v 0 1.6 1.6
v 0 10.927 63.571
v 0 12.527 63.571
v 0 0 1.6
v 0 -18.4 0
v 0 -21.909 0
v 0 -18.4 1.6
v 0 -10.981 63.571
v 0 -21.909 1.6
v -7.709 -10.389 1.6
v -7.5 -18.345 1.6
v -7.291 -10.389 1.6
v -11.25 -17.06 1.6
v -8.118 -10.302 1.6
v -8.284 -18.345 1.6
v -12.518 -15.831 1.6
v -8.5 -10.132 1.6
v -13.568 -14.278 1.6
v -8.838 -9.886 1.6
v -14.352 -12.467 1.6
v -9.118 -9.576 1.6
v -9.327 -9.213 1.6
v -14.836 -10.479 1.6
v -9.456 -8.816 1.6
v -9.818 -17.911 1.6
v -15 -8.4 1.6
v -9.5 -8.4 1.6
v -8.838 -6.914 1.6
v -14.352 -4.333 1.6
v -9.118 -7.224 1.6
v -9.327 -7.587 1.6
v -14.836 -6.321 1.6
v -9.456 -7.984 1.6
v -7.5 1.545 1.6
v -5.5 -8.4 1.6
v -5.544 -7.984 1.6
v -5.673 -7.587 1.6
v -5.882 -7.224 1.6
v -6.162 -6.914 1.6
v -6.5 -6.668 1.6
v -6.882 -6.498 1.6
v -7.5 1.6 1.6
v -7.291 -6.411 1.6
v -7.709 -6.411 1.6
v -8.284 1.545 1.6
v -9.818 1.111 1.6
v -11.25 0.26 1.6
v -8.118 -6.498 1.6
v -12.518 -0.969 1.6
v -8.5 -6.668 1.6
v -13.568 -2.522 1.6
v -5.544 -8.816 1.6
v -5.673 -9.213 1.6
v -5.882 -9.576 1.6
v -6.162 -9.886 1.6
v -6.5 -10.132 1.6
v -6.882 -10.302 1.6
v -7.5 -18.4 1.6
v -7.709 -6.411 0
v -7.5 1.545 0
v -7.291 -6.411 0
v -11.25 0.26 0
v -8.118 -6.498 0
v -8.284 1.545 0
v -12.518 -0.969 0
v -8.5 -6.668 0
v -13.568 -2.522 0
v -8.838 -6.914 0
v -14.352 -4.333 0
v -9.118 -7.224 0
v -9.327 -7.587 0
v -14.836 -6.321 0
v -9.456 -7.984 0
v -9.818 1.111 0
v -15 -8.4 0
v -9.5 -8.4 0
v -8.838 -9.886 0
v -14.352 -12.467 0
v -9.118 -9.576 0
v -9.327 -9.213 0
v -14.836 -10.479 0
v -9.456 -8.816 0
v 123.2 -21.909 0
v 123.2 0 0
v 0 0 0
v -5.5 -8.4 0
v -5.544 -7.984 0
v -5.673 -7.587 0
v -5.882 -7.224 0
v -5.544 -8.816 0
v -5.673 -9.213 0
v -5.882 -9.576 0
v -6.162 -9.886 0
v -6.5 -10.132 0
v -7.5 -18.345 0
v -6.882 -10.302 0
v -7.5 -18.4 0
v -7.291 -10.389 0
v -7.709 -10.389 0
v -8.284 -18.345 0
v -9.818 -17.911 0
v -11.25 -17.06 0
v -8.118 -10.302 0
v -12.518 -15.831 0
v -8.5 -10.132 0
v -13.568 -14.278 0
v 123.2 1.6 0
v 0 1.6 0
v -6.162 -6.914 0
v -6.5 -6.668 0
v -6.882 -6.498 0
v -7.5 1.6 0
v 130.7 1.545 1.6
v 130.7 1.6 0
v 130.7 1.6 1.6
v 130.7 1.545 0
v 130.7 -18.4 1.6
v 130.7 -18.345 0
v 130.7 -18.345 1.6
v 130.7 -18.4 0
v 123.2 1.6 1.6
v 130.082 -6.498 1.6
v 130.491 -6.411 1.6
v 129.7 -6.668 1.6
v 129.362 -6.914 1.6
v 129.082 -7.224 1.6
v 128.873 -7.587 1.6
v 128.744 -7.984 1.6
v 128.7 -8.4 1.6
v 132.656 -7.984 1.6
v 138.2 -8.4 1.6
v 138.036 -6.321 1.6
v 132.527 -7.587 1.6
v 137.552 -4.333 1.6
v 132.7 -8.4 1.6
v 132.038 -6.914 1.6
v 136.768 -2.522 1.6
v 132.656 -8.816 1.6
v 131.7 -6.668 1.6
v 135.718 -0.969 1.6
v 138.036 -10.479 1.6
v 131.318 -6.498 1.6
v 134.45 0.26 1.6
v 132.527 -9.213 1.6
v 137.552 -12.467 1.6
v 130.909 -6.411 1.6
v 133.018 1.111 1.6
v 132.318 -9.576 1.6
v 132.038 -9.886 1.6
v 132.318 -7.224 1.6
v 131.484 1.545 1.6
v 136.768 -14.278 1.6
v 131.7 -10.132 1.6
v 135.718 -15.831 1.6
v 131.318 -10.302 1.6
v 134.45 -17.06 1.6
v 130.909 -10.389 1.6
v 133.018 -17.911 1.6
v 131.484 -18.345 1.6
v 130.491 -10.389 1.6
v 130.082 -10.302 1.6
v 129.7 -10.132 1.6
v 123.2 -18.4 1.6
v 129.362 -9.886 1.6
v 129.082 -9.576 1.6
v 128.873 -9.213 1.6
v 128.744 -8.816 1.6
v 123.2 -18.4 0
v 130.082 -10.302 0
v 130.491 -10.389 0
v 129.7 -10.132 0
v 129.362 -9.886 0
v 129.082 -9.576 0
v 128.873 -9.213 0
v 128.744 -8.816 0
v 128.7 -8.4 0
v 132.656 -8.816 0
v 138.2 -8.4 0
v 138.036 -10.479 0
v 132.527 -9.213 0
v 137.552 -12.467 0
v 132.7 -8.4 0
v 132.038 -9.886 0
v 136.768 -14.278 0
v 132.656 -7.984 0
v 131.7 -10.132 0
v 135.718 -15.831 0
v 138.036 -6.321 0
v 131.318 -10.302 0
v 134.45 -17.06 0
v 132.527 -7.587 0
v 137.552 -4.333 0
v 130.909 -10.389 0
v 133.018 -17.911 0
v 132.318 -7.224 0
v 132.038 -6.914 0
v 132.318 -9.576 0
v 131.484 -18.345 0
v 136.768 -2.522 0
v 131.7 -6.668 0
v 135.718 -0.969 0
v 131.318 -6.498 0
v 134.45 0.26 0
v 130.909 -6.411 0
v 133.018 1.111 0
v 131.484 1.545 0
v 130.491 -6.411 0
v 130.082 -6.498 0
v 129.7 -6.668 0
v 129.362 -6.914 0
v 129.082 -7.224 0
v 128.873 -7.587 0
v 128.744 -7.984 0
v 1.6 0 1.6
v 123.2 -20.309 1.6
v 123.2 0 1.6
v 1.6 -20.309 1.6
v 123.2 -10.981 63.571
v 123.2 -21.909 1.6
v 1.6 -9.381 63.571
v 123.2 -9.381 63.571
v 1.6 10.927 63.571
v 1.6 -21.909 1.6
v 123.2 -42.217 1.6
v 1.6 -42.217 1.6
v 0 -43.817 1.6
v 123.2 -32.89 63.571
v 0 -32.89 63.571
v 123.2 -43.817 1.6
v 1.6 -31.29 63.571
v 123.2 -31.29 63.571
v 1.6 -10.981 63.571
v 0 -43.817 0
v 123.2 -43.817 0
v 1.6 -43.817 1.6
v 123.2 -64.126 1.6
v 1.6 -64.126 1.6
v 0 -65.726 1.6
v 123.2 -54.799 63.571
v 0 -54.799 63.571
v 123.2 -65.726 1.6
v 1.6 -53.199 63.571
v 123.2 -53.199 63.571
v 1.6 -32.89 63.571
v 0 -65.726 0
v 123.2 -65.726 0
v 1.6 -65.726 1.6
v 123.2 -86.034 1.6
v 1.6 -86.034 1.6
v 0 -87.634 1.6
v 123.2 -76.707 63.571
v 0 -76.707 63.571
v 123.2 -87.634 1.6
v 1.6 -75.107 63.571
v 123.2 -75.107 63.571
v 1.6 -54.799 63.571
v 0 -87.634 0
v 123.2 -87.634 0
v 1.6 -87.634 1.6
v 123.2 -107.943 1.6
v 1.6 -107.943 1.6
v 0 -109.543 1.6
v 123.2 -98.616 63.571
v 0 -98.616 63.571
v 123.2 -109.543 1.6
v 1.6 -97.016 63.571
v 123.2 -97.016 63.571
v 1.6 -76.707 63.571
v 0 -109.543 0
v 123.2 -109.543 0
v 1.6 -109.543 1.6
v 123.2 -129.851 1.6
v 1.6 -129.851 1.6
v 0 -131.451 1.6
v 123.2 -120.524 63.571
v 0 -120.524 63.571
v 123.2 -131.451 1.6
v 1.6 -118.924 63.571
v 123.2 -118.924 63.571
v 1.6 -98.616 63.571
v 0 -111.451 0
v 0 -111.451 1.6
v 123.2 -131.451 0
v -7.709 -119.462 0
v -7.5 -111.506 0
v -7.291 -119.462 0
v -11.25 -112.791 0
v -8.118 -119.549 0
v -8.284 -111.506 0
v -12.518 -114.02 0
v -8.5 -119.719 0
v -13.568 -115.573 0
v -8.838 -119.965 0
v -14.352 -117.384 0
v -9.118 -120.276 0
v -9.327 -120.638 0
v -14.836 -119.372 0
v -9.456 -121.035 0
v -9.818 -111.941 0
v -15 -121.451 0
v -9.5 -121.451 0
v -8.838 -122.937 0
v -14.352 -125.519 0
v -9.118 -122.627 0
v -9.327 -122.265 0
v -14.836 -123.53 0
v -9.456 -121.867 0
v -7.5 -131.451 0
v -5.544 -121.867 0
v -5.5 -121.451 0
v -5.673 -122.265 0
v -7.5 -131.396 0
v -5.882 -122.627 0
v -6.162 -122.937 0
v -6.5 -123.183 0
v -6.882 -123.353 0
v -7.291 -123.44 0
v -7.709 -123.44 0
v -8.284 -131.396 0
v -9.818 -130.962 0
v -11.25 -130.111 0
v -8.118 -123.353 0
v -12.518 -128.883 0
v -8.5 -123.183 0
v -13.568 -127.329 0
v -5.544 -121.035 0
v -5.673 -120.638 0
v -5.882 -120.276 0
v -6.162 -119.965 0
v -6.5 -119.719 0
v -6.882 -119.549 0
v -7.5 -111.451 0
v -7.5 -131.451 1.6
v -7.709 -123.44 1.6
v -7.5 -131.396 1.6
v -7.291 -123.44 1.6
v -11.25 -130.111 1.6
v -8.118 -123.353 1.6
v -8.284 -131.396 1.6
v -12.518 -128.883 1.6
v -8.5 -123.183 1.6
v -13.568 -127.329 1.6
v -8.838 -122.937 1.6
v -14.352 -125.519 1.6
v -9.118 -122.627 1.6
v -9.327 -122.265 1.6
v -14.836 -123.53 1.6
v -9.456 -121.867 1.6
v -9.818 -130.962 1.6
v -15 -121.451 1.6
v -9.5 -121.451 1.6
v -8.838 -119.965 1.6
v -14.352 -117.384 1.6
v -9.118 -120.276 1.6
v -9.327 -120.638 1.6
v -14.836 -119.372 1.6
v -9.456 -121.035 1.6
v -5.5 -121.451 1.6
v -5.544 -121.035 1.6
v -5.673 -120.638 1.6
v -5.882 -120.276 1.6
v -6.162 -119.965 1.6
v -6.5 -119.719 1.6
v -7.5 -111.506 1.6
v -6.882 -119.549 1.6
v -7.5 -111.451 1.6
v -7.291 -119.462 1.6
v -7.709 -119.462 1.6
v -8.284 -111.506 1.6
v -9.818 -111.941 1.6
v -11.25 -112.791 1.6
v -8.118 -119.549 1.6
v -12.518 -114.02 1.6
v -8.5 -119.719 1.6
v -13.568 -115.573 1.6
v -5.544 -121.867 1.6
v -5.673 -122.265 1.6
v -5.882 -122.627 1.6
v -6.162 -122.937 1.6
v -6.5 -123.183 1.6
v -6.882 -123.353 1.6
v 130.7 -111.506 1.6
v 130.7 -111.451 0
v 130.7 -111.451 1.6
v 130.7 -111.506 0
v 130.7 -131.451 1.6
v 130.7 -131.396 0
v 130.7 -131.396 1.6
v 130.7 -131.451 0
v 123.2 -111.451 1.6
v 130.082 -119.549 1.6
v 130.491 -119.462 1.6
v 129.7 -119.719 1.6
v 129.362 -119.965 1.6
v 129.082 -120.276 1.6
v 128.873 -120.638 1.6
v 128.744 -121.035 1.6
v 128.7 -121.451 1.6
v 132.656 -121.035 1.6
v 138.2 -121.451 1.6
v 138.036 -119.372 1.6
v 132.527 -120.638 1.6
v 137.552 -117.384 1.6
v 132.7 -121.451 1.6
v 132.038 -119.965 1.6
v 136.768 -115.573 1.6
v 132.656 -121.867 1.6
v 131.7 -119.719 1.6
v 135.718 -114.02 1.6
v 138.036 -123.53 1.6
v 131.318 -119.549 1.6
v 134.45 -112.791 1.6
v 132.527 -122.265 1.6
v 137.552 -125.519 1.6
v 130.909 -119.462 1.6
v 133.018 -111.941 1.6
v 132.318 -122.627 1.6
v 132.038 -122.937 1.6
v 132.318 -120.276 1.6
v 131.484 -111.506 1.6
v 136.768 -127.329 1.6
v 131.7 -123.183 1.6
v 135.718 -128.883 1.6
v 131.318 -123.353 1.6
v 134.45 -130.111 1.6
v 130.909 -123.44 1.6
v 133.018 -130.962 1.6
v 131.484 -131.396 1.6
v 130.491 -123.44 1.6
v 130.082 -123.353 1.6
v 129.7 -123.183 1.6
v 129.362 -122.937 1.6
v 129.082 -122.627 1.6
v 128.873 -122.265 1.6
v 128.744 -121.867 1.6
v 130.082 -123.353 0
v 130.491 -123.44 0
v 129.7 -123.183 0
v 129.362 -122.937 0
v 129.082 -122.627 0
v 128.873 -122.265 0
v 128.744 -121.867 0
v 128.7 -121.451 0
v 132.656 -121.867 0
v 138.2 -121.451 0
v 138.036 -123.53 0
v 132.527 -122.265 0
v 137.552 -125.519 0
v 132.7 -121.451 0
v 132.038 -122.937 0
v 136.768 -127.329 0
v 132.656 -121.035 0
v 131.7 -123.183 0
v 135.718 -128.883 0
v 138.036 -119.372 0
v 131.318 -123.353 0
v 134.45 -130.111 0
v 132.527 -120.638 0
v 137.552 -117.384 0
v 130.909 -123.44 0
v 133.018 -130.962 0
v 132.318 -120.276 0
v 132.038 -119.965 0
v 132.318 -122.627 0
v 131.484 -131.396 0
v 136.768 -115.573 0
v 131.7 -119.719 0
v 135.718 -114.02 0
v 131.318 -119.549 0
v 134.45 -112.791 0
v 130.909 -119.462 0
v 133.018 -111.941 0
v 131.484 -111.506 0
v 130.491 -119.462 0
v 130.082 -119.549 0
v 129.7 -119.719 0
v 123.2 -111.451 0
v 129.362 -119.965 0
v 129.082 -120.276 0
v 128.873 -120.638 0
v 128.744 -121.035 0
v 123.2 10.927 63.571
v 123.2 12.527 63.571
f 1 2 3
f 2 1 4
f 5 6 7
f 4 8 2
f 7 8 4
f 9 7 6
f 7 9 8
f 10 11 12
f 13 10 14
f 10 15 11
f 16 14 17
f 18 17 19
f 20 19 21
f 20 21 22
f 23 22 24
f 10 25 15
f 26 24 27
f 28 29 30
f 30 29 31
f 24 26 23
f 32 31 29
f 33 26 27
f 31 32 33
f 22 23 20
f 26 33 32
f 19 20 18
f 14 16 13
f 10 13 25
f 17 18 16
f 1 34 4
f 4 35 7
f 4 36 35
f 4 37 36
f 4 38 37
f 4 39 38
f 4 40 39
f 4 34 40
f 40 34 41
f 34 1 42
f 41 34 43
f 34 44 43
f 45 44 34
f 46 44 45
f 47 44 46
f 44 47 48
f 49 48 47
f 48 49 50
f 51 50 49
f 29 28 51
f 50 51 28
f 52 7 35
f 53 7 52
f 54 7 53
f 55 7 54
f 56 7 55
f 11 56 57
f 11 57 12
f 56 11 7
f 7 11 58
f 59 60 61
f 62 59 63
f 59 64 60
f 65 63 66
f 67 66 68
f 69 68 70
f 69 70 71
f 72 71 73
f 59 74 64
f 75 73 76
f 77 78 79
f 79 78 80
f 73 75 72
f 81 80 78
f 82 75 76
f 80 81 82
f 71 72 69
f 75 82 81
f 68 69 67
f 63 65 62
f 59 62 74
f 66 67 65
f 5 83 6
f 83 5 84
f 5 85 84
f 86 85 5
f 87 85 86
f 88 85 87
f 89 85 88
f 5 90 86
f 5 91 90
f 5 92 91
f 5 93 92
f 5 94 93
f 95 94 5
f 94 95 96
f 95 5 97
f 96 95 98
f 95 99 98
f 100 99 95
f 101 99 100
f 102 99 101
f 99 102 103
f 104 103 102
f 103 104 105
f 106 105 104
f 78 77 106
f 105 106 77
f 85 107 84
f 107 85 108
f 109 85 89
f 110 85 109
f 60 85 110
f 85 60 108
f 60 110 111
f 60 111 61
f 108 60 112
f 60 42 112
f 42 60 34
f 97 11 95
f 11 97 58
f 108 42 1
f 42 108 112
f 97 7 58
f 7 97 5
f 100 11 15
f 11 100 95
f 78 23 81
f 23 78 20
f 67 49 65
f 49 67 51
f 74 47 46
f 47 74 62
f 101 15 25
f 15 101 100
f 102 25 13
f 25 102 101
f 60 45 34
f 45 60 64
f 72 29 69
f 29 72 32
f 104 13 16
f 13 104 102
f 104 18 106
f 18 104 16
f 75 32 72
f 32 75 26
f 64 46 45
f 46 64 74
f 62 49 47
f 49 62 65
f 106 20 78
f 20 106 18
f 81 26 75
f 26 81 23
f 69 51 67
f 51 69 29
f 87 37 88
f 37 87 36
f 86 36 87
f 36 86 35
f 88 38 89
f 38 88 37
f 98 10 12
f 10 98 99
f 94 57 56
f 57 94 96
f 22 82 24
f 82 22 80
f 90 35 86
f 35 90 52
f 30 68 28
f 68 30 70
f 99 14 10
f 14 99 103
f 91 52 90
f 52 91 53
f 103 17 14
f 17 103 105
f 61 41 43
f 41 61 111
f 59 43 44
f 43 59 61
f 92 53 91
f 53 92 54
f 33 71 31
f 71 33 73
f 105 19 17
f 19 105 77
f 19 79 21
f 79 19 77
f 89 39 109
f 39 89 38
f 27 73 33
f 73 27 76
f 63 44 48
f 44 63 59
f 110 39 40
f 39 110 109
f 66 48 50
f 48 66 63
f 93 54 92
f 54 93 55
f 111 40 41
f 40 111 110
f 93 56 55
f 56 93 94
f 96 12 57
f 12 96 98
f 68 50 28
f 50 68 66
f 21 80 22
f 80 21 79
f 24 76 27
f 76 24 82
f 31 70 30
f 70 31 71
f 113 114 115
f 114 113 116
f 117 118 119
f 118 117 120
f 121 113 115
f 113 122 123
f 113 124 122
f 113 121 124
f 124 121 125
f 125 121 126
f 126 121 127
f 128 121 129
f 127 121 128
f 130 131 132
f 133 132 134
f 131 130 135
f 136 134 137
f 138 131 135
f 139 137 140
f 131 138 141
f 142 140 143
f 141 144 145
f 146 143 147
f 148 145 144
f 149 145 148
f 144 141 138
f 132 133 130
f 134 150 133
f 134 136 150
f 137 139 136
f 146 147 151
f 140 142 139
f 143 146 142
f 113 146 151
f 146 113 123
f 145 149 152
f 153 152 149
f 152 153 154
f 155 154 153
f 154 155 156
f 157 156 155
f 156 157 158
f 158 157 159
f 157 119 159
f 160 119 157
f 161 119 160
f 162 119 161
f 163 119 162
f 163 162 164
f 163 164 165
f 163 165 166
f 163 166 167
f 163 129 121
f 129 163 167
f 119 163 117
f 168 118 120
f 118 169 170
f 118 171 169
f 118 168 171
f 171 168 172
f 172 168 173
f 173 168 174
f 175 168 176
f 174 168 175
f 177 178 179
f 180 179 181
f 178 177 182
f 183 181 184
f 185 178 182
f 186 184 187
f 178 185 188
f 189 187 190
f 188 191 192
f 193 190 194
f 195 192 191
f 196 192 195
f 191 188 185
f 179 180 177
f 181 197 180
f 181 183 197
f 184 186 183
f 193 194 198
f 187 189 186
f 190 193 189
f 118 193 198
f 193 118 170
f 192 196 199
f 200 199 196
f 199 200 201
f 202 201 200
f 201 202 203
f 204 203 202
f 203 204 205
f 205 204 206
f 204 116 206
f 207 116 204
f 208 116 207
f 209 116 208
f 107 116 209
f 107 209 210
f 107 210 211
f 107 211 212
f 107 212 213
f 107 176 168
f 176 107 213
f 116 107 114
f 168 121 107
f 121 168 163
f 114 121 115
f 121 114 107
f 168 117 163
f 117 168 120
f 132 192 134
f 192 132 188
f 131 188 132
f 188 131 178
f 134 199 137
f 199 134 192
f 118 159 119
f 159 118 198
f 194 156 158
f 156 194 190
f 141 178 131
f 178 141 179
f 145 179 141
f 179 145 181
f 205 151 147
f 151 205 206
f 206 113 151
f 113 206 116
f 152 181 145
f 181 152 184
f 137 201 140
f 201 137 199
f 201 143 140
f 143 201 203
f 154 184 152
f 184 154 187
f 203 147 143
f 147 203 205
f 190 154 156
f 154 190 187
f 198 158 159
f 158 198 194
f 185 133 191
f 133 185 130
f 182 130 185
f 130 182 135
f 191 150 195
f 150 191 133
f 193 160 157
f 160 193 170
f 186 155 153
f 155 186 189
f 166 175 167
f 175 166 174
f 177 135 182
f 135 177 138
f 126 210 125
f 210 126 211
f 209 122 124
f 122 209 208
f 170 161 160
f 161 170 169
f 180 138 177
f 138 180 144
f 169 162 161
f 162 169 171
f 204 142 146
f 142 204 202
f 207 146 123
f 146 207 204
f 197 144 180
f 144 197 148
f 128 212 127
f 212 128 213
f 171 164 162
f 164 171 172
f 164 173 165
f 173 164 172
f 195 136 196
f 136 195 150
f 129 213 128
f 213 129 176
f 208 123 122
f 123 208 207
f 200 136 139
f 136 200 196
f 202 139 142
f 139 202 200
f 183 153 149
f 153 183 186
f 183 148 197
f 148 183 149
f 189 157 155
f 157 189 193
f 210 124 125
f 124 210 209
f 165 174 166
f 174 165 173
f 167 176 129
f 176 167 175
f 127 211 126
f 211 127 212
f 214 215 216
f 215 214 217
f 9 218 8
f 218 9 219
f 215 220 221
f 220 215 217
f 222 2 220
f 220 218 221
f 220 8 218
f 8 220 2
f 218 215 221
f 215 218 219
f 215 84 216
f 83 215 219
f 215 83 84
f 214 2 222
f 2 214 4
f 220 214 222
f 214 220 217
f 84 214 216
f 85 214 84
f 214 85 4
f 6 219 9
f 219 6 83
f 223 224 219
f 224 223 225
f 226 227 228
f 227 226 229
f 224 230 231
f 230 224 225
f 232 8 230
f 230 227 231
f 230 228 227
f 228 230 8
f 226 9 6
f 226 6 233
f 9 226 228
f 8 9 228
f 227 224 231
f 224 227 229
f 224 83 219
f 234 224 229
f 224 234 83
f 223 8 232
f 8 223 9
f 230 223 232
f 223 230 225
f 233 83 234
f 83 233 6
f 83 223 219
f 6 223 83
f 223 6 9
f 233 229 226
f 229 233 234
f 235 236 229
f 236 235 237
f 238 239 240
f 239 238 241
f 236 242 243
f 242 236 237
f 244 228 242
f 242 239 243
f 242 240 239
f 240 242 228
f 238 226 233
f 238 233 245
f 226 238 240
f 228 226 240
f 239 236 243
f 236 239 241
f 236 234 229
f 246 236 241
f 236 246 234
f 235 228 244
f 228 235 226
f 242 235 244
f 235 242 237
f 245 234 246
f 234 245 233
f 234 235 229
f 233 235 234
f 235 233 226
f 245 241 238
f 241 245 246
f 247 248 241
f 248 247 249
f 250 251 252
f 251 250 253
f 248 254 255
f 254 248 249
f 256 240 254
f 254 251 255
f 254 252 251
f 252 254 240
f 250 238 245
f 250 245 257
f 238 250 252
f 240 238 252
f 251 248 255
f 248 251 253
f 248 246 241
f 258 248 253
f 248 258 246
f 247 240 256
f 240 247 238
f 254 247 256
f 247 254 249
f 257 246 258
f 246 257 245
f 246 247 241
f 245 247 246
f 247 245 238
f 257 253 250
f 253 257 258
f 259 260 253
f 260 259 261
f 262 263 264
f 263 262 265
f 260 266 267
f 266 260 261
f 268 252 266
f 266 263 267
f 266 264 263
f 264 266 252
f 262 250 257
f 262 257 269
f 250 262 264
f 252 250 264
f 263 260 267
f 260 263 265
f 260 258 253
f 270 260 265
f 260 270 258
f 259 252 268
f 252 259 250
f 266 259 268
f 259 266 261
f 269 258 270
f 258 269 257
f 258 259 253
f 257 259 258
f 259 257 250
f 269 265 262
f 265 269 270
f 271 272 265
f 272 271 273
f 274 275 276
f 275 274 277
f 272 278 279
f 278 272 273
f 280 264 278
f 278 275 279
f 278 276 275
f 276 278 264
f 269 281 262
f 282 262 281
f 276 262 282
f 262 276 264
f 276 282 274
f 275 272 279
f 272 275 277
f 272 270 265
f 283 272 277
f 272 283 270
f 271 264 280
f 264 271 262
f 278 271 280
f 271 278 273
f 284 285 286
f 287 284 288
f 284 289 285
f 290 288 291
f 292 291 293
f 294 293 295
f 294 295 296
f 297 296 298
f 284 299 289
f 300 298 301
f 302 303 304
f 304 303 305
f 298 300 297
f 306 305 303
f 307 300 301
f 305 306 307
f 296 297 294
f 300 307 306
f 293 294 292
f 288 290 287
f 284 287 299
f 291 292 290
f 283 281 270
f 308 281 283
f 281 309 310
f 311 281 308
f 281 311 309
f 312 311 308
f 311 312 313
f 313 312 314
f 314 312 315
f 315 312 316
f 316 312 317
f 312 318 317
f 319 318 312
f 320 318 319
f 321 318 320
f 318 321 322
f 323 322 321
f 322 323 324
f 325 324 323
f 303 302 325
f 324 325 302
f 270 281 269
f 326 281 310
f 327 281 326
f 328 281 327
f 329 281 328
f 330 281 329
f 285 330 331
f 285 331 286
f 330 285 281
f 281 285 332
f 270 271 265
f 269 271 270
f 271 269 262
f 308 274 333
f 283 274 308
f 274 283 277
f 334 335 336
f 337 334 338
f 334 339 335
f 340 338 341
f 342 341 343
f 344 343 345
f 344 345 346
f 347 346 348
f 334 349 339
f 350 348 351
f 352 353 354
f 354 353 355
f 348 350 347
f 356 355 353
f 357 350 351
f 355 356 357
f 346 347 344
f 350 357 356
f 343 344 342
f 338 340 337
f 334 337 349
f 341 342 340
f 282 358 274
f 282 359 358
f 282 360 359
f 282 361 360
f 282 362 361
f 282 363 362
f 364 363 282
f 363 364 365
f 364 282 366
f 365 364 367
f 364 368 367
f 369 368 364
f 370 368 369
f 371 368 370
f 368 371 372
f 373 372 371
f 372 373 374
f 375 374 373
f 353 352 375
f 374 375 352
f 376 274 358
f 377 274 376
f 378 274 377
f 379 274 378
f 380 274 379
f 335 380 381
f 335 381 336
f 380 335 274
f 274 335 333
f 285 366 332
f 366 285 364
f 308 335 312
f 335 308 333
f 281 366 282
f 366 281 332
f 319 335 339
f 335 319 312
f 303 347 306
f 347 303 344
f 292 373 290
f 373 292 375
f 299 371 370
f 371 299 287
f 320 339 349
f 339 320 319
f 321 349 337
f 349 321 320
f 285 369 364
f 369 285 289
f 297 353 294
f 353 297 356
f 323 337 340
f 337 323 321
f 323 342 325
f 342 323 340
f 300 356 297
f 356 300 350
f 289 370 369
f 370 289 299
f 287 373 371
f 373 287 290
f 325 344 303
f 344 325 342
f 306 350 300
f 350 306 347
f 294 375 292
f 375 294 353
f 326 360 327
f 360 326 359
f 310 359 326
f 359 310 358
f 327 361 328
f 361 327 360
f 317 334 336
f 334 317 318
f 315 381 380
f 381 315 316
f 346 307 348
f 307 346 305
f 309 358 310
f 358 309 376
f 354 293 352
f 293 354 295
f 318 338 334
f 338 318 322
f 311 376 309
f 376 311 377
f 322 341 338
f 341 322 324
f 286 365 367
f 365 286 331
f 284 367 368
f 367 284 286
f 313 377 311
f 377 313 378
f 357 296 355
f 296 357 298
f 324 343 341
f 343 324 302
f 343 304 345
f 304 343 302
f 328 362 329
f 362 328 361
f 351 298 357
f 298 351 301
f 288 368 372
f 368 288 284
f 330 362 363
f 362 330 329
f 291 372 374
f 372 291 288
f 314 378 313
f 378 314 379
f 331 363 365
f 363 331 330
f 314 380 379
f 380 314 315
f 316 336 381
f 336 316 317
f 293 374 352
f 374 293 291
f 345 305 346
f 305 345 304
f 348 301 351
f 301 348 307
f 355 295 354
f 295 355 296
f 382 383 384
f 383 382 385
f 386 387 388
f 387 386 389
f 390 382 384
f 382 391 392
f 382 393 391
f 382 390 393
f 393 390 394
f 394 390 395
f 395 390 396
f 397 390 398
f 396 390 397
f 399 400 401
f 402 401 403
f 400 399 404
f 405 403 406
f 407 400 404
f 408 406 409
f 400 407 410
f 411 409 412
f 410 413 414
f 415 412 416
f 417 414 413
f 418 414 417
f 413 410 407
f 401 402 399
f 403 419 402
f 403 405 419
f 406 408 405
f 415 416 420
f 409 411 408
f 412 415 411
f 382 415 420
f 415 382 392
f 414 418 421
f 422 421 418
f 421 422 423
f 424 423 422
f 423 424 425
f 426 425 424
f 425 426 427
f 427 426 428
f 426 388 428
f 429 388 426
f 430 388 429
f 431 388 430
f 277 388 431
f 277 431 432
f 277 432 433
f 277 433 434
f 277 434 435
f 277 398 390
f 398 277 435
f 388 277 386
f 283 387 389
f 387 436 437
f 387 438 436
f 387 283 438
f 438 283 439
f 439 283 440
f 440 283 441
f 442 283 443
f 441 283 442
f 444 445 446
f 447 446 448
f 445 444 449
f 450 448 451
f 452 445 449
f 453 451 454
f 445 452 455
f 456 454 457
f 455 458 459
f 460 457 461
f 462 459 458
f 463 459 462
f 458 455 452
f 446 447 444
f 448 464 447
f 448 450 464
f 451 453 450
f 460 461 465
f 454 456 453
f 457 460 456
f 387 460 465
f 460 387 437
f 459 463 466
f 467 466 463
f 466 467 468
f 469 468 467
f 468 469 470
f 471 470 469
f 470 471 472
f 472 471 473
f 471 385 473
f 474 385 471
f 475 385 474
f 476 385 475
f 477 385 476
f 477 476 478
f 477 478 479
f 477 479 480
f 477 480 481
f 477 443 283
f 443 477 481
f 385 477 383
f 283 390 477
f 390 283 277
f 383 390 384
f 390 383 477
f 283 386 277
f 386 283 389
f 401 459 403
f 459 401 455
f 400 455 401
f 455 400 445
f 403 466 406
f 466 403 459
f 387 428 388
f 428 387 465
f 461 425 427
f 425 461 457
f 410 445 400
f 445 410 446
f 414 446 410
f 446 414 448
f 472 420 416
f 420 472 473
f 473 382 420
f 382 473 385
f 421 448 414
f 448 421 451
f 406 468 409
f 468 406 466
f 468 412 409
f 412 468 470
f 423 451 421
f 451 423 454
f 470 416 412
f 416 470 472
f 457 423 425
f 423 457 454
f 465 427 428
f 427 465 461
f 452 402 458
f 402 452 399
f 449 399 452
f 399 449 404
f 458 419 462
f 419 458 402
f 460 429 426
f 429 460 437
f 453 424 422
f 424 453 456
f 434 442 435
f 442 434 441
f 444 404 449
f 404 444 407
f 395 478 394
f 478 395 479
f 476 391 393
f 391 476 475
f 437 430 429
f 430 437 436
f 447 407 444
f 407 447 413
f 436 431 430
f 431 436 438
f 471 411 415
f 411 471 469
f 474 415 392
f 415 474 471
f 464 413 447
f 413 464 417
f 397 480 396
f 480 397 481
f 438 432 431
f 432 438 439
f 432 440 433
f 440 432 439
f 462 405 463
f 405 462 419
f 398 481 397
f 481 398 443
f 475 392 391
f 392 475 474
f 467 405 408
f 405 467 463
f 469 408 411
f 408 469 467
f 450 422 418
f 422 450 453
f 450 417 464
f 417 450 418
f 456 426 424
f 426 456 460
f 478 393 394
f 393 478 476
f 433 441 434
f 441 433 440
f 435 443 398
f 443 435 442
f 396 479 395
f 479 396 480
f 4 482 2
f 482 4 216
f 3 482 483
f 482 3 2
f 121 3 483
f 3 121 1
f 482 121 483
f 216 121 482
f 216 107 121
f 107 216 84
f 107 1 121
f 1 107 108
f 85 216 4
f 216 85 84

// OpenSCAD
phone_height = 120;
phone_width = 90;
phone_thickness = 20;
shelf_angle = 10;
shelf_width_percentage = 66;  // Recommend > 50
number_of_shelves = 6;
thickness = 1.6;
sides = 1;  // [0:No, 1:Left, 2:Right, 3:Both]
tabs = 1;  // [0:No, 1:Yes]
tab_width = 15;
tab_height = 20;
tab_hole_diameter = 4;

width_adjusted = phone_width * shelf_width_percentage / 100 + phone_thickness / tan(90 - shelf_angle);
echo(width_adjusted=width_adjusted);
height_adjusted = phone_thickness / sin(90 - shelf_angle);
echo(height_adjusted=height_adjusted);
bottom_tab_offset = -number_of_shelves * (height_adjusted + thickness);
$fn = 30;

module shelf(length, width, height, thickness, shelf_angle, sides) {
  delta_y = sin(shelf_angle) * width;
  echo(delta_y = delta_y);
  delta_z = cos(shelf_angle) * width;
  echo(delta_z = delta_z);
  polyhedron([
    [0, 0, thickness],
    [0, thickness, thickness],
    [length, thickness, thickness],
    [length, 0, thickness],
    [0, delta_y, thickness + delta_z],
    [0, delta_y + thickness, thickness + delta_z],
    [length, delta_y + thickness, thickness + delta_z],
    [length, delta_y, thickness + delta_z]],
    [
    [0, 3, 2, 1],  // Bottom
    [0, 1, 5, 4],  // Back
    [4, 5, 6, 7],  // Top
    [2, 3, 7, 6],  // Front
    [0, 4, 7, 3],  // Left
    [1, 2, 6, 5]]);  // Right
  if (sides == 1 || sides == 3) {
    polyhedron([
      [0, thickness, thickness],
      [0, thickness + height, thickness],
      [thickness, thickness + height, thickness],
      [thickness, thickness, thickness],
      [0, delta_y + thickness, thickness + delta_z],
      [0, delta_y + thickness + height, thickness + delta_z],
      [thickness, delta_y + thickness + height, thickness + delta_z],
      [thickness, delta_y + thickness, thickness + delta_z]],
      [
      [0, 3, 2, 1],  // Bottom
      [0, 1, 5, 4],  // Back
      [4, 5, 6, 7],  // Top
      [2, 3, 7, 6],  // Front
      [0, 4, 7, 3],  // Left
      [1, 2, 6, 5]]);  // Right
  }
  if (sides == 2 || sides == 3) {
    polyhedron([
      [length - thickness, thickness, thickness],
      [length - thickness, thickness + height, thickness],
      [length, thickness + height, thickness],
      [length, thickness, thickness],
      [length - thickness, delta_y + thickness, thickness + delta_z],
      [length - thickness, delta_y + thickness + height, thickness + delta_z],
      [length, delta_y + thickness + height, thickness + delta_z],
      [length, delta_y + thickness, thickness + delta_z]],
      [
      [0, 3, 2, 1],  // Bottom
      [0, 1, 5, 4],  // Back
      [4, 5, 6, 7],  // Top
      [2, 3, 7, 6],  // Front
      [0, 4, 7, 3],  // Left
      [1, 2, 6, 5]]);  // Right
  }
}

module tab(width, height, thickness, diameter, left_side) {
  difference() {
    union() {
      translate([left_side ? width * 0.5 : 0, 0, 0]) {
        cube([width * 0.5, height, thickness]);
      }
      translate([width * 0.5, height * 0.5, 0]) scale([width / height, 1, 1]) {
        cylinder(h=thickness, r=height * 0.5);
      }
    }
    translate([width * 0.5, height * 0.5, -thickness * 0.1]) {
      cylinder(h=thickness * 1.2, r=diameter * 0.5);
    }
  }
}


module left_tab(width, height, thickness, diameter) {
  tab(width, height, thickness, diameter, 1);
}


module right_tab(width, height, thickness, diameter) {
  tab(width, height, thickness, diameter, 0);
}


// Top shelf
shelf(phone_height + 2 * thickness, width_adjusted,
      height_adjusted, thickness, shelf_angle, 0);
cube([phone_height + 2 * thickness, thickness, thickness]);
if (tabs) {
  translate([-tab_width, thickness - tab_height, 0]) {
    left_tab(tab_width, tab_height, thickness, tab_hole_diameter);
  }
  translate([2 * thickness + phone_height, thickness - tab_height, 0]) {
    right_tab(tab_width, tab_height, thickness, tab_hole_diameter);
  }
}

for(ii = [1:number_of_shelves]) {
  translate([0, -ii * (height_adjusted + thickness), 0]) {
    cube([phone_height + 2 * thickness,
          height_adjusted + thickness, thickness]);
    shelf(phone_height + 2 * thickness, width_adjusted,
          height_adjusted, thickness, shelf_angle, sides);
  }
}
if (tabs) {
  translate([-tab_width, bottom_tab_offset, 0]) {
    left_tab(tab_width, tab_height, thickness, tab_hole_diameter);
  }
  translate([2 * thickness + phone_height, bottom_tab_offset, 0]) {
    right_tab(tab_width, tab_height, thickness, tab_hole_diameter);
  }
}
